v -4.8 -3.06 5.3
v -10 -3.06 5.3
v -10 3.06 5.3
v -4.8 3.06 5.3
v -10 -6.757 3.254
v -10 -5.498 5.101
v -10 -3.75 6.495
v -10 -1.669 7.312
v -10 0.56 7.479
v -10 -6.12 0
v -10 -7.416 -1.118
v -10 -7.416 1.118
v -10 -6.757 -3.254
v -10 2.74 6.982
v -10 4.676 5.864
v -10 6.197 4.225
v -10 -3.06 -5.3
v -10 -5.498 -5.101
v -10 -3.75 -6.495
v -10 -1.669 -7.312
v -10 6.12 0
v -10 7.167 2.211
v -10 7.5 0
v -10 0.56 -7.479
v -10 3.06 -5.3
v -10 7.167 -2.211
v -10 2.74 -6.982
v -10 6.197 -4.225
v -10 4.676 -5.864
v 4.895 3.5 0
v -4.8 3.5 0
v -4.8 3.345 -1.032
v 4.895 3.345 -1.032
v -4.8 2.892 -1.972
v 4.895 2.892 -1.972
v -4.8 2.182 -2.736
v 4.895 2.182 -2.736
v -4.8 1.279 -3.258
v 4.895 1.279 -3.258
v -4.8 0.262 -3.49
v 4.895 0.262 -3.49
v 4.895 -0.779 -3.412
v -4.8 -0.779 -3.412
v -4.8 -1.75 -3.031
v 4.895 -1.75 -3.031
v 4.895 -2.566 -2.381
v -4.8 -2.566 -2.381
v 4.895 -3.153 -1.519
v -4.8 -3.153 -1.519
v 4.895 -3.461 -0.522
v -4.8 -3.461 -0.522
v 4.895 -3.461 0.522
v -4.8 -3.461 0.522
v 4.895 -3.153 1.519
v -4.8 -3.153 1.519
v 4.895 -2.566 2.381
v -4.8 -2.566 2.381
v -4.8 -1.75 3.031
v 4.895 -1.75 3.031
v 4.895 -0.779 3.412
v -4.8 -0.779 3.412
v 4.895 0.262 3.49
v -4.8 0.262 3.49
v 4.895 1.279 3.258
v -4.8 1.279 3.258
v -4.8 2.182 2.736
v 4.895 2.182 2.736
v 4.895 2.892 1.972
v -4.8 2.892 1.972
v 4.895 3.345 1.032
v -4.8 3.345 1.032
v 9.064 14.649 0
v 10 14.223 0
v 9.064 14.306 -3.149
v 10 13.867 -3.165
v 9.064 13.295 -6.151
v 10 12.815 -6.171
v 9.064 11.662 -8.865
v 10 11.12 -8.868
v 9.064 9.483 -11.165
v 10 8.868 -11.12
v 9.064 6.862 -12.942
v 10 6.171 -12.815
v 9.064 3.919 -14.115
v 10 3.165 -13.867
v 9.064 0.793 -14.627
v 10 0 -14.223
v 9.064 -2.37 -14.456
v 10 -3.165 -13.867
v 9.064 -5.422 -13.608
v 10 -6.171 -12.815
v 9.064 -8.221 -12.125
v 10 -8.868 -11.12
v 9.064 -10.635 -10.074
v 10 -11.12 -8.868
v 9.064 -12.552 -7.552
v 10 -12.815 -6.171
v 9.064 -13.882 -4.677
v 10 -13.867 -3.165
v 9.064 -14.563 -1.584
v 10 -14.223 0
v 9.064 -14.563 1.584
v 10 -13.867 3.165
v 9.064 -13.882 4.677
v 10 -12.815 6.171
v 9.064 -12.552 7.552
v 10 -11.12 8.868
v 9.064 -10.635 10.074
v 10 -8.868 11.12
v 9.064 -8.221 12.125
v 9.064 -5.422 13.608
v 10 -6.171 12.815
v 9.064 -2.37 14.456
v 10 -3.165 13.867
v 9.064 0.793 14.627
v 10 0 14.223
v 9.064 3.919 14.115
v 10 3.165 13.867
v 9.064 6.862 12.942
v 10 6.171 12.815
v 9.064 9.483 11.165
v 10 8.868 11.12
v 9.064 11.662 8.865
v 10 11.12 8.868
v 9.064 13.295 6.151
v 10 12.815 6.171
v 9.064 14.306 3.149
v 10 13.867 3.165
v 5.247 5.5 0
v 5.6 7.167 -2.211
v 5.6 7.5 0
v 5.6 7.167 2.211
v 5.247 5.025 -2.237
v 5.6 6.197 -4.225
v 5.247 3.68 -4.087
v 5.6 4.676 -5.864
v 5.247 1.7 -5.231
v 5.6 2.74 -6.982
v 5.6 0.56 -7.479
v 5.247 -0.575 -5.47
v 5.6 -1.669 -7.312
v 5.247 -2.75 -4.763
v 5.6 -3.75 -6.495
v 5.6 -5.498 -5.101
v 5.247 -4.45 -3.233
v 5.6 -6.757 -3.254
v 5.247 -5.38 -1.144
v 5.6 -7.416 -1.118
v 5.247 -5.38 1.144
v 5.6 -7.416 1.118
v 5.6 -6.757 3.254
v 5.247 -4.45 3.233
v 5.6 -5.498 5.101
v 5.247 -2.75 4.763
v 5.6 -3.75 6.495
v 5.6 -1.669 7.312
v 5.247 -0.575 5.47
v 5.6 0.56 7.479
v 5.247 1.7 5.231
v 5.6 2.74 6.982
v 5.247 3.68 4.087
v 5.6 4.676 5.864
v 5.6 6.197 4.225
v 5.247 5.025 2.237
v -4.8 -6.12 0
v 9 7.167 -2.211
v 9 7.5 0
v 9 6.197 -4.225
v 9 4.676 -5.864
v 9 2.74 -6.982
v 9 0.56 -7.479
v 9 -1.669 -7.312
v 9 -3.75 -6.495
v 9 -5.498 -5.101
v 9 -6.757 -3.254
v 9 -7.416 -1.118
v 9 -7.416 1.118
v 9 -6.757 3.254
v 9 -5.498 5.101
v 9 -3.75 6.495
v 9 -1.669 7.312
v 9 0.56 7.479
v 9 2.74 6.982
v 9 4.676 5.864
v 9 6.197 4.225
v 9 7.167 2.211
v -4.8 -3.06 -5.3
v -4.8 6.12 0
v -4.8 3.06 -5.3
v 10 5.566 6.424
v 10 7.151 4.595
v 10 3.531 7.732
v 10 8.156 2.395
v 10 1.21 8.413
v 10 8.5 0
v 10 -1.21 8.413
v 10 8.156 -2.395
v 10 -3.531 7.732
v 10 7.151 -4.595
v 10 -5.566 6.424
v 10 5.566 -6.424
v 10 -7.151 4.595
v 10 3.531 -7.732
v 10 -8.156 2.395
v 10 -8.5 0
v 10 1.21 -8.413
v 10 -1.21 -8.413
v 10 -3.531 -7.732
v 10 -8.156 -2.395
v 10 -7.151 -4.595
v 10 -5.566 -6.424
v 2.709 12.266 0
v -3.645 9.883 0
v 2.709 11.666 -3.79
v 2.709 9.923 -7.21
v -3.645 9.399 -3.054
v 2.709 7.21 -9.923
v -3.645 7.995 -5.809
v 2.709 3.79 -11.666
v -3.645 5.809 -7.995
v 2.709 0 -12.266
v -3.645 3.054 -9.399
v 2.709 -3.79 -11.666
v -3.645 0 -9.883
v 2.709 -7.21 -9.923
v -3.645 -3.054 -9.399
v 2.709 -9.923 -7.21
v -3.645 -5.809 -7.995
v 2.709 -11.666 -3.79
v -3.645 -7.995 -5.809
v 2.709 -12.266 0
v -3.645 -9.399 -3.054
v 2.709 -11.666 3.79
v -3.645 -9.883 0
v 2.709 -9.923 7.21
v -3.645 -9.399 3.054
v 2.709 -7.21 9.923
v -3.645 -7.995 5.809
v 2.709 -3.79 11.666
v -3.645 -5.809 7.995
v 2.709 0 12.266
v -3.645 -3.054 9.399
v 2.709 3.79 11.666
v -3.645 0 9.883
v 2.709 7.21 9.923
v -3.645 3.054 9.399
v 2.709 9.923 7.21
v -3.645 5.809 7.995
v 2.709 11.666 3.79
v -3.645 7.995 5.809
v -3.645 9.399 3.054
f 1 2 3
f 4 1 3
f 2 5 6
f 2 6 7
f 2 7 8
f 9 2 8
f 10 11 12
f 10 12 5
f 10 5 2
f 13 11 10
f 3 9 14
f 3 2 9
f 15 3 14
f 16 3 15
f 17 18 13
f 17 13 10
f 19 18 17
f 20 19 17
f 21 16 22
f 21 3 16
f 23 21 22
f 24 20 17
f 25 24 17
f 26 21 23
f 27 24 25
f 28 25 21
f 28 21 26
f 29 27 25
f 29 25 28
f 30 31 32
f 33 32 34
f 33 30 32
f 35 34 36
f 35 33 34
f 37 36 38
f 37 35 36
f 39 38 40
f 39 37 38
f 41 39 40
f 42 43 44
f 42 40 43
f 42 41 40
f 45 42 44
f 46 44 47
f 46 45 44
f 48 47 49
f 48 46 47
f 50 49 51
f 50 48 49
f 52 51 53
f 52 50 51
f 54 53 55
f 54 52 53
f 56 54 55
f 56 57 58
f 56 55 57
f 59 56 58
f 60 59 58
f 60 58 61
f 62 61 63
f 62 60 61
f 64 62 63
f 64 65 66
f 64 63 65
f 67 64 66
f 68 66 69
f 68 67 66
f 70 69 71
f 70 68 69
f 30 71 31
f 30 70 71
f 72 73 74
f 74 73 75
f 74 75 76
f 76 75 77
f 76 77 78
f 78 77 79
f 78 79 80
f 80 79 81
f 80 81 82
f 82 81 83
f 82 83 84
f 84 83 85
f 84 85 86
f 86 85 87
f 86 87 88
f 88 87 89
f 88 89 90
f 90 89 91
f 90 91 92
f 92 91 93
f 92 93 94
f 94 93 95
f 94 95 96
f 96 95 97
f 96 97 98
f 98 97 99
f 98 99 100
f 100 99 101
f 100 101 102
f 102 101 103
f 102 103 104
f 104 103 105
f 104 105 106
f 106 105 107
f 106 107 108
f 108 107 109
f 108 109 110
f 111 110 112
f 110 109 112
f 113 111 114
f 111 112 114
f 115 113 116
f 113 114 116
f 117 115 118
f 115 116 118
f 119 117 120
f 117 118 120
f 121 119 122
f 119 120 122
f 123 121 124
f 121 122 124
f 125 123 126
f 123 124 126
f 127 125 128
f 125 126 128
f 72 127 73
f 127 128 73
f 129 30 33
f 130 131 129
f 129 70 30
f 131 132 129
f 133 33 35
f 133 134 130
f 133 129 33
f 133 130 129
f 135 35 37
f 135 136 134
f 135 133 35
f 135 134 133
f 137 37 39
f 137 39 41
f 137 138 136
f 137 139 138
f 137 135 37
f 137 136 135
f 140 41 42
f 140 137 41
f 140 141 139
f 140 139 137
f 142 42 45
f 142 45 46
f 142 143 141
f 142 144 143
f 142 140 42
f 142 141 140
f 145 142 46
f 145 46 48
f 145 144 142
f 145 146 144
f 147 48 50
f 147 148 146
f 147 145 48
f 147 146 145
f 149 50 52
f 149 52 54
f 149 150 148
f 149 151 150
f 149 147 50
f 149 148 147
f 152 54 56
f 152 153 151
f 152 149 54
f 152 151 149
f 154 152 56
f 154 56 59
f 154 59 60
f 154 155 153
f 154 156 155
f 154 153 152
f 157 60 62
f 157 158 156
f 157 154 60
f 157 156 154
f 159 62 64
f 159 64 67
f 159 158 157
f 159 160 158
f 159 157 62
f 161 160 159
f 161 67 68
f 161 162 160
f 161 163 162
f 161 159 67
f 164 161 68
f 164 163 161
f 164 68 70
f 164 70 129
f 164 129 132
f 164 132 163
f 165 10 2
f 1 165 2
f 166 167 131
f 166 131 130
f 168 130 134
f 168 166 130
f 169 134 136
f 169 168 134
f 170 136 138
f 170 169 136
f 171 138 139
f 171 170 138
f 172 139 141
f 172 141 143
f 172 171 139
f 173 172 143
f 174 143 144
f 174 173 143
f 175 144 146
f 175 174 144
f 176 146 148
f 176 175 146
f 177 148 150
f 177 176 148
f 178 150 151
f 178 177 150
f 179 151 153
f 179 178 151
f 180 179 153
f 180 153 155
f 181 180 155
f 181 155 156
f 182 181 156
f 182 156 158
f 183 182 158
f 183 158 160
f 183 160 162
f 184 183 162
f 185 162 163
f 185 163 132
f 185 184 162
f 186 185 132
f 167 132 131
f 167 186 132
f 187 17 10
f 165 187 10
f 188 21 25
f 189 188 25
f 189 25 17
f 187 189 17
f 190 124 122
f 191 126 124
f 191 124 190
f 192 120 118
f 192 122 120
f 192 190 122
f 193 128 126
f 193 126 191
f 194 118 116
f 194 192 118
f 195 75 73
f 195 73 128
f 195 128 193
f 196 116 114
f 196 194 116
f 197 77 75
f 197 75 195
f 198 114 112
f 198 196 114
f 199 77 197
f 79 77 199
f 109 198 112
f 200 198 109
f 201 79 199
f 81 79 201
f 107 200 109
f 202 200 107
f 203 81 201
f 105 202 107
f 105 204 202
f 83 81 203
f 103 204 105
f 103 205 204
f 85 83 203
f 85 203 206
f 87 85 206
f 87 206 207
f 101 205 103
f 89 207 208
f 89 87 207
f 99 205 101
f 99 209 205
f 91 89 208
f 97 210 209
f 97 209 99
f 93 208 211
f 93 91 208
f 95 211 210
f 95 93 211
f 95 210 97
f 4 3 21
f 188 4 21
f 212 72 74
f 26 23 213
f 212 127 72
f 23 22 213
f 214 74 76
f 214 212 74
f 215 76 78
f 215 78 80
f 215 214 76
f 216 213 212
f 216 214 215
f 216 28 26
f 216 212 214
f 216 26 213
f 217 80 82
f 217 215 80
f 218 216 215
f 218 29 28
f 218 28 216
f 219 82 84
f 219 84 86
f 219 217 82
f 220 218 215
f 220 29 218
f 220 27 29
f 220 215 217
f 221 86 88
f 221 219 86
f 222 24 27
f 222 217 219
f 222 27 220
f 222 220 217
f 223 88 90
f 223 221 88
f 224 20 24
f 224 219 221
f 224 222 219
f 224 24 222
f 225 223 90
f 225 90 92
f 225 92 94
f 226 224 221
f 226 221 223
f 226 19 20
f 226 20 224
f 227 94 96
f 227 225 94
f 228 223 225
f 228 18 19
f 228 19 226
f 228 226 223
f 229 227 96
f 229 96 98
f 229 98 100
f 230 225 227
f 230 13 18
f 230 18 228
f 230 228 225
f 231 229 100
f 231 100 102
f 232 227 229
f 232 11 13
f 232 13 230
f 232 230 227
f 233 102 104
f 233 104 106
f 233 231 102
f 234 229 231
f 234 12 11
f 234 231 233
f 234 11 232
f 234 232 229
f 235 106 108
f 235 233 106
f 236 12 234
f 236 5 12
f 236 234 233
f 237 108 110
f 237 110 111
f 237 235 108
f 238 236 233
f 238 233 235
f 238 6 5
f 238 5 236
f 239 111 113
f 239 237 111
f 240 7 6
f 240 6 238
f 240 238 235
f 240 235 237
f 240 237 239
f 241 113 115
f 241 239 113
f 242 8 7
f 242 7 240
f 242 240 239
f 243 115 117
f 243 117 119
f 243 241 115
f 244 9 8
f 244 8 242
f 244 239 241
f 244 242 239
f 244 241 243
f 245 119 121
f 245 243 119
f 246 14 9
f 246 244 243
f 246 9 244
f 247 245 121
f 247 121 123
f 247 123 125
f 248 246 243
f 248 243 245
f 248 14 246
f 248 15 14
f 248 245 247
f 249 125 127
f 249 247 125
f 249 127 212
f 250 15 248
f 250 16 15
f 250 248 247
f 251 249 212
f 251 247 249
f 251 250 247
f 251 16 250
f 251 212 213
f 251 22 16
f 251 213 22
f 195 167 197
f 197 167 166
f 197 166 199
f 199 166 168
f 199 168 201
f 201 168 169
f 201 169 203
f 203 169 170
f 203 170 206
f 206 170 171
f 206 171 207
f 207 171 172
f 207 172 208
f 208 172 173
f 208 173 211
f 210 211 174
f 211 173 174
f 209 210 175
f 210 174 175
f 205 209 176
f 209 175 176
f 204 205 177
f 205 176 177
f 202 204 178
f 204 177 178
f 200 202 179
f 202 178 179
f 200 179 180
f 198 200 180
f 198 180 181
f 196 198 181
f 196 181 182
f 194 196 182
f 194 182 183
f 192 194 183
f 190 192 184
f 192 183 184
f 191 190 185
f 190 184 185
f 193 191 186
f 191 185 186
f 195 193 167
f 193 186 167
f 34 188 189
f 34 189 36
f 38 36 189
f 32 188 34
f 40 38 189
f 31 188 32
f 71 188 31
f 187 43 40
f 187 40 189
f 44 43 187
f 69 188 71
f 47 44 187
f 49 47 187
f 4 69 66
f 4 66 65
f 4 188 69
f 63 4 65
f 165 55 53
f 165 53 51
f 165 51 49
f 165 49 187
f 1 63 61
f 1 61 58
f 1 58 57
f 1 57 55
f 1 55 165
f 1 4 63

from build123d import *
from OCP.BRepFilletAPI import BRepFilletAPI_MakeChamfer

# Parameters (mm, degrees)
CORTAR_EXTRUIR1_DEPTH = 5.2
CHAFL_N1_SIZE         = 1
CHAFL_N1_SIZE2        = 0.776727613


with BuildPart() as part:
    # Croquis1 → Revolución1 (revolve)
    with BuildSketch(Plane(origin=(0, 0, 0), x_dir=(0, 1, 0), z_dir=(0, 0, 1))):
        Polygon((7.5, -10), (15, -10), (7.5, 10), (3.5, 10), (3.5, -4.894692077), (7.5, -5.6), align=None)
    revolve(axis=Axis((0, 0, 0), (-1, 0, 0)))

    # Croquis2 → Cortar-Extruir1 (cut)
    with BuildSketch(Plane(origin=(-10, 0, 0), x_dir=(0, -1, 0), z_dir=(-1, 0, 0))):
        Polygon((3.059956427, -5.3), (6.119912853, 0), (3.059956427, 5.3), (-3.059956427, 5.3), (-6.119912853, 0), (-3.059956427, -5.3), align=None)
    extrude(amount=-CORTAR_EXTRUIR1_DEPTH, mode=Mode.SUBTRACT)

    # Chaflán1: one chamfer whose edges measure the first distance from different faces: ONE call of the kernel's chamfer builder (chamfer() names one face for all edges)
    chafl_n1_edges_1 = [part.edges().sort_by_distance(p)[0] for p in [
        (10, -7.5, 0),
    ]]
    chafl_n1_edges_2 = [part.edges().sort_by_distance(p)[0] for p in [
        (10, -15, 0),
    ]]
    chafl_n1_side_2 = [part.faces().sort_by_distance(p)[0] for p in [
        (0, -11.25, 0),
    ]]
    chafl_n1 = BRepFilletAPI_MakeChamfer(part.part.solid().wrapped)
    for e in chafl_n1_edges_1:
        chafl_n1.Add(CHAFL_N1_SIZE, e.wrapped)
    for e in chafl_n1_edges_2:
        chafl_n1.Add(CHAFL_N1_SIZE, CHAFL_N1_SIZE2, e.wrapped, chafl_n1_side_2[0].wrapped)  # the first distance lies on this face
    add(Compound.cast(chafl_n1.Shape()), mode=Mode.REPLACE)


solid = part.part
